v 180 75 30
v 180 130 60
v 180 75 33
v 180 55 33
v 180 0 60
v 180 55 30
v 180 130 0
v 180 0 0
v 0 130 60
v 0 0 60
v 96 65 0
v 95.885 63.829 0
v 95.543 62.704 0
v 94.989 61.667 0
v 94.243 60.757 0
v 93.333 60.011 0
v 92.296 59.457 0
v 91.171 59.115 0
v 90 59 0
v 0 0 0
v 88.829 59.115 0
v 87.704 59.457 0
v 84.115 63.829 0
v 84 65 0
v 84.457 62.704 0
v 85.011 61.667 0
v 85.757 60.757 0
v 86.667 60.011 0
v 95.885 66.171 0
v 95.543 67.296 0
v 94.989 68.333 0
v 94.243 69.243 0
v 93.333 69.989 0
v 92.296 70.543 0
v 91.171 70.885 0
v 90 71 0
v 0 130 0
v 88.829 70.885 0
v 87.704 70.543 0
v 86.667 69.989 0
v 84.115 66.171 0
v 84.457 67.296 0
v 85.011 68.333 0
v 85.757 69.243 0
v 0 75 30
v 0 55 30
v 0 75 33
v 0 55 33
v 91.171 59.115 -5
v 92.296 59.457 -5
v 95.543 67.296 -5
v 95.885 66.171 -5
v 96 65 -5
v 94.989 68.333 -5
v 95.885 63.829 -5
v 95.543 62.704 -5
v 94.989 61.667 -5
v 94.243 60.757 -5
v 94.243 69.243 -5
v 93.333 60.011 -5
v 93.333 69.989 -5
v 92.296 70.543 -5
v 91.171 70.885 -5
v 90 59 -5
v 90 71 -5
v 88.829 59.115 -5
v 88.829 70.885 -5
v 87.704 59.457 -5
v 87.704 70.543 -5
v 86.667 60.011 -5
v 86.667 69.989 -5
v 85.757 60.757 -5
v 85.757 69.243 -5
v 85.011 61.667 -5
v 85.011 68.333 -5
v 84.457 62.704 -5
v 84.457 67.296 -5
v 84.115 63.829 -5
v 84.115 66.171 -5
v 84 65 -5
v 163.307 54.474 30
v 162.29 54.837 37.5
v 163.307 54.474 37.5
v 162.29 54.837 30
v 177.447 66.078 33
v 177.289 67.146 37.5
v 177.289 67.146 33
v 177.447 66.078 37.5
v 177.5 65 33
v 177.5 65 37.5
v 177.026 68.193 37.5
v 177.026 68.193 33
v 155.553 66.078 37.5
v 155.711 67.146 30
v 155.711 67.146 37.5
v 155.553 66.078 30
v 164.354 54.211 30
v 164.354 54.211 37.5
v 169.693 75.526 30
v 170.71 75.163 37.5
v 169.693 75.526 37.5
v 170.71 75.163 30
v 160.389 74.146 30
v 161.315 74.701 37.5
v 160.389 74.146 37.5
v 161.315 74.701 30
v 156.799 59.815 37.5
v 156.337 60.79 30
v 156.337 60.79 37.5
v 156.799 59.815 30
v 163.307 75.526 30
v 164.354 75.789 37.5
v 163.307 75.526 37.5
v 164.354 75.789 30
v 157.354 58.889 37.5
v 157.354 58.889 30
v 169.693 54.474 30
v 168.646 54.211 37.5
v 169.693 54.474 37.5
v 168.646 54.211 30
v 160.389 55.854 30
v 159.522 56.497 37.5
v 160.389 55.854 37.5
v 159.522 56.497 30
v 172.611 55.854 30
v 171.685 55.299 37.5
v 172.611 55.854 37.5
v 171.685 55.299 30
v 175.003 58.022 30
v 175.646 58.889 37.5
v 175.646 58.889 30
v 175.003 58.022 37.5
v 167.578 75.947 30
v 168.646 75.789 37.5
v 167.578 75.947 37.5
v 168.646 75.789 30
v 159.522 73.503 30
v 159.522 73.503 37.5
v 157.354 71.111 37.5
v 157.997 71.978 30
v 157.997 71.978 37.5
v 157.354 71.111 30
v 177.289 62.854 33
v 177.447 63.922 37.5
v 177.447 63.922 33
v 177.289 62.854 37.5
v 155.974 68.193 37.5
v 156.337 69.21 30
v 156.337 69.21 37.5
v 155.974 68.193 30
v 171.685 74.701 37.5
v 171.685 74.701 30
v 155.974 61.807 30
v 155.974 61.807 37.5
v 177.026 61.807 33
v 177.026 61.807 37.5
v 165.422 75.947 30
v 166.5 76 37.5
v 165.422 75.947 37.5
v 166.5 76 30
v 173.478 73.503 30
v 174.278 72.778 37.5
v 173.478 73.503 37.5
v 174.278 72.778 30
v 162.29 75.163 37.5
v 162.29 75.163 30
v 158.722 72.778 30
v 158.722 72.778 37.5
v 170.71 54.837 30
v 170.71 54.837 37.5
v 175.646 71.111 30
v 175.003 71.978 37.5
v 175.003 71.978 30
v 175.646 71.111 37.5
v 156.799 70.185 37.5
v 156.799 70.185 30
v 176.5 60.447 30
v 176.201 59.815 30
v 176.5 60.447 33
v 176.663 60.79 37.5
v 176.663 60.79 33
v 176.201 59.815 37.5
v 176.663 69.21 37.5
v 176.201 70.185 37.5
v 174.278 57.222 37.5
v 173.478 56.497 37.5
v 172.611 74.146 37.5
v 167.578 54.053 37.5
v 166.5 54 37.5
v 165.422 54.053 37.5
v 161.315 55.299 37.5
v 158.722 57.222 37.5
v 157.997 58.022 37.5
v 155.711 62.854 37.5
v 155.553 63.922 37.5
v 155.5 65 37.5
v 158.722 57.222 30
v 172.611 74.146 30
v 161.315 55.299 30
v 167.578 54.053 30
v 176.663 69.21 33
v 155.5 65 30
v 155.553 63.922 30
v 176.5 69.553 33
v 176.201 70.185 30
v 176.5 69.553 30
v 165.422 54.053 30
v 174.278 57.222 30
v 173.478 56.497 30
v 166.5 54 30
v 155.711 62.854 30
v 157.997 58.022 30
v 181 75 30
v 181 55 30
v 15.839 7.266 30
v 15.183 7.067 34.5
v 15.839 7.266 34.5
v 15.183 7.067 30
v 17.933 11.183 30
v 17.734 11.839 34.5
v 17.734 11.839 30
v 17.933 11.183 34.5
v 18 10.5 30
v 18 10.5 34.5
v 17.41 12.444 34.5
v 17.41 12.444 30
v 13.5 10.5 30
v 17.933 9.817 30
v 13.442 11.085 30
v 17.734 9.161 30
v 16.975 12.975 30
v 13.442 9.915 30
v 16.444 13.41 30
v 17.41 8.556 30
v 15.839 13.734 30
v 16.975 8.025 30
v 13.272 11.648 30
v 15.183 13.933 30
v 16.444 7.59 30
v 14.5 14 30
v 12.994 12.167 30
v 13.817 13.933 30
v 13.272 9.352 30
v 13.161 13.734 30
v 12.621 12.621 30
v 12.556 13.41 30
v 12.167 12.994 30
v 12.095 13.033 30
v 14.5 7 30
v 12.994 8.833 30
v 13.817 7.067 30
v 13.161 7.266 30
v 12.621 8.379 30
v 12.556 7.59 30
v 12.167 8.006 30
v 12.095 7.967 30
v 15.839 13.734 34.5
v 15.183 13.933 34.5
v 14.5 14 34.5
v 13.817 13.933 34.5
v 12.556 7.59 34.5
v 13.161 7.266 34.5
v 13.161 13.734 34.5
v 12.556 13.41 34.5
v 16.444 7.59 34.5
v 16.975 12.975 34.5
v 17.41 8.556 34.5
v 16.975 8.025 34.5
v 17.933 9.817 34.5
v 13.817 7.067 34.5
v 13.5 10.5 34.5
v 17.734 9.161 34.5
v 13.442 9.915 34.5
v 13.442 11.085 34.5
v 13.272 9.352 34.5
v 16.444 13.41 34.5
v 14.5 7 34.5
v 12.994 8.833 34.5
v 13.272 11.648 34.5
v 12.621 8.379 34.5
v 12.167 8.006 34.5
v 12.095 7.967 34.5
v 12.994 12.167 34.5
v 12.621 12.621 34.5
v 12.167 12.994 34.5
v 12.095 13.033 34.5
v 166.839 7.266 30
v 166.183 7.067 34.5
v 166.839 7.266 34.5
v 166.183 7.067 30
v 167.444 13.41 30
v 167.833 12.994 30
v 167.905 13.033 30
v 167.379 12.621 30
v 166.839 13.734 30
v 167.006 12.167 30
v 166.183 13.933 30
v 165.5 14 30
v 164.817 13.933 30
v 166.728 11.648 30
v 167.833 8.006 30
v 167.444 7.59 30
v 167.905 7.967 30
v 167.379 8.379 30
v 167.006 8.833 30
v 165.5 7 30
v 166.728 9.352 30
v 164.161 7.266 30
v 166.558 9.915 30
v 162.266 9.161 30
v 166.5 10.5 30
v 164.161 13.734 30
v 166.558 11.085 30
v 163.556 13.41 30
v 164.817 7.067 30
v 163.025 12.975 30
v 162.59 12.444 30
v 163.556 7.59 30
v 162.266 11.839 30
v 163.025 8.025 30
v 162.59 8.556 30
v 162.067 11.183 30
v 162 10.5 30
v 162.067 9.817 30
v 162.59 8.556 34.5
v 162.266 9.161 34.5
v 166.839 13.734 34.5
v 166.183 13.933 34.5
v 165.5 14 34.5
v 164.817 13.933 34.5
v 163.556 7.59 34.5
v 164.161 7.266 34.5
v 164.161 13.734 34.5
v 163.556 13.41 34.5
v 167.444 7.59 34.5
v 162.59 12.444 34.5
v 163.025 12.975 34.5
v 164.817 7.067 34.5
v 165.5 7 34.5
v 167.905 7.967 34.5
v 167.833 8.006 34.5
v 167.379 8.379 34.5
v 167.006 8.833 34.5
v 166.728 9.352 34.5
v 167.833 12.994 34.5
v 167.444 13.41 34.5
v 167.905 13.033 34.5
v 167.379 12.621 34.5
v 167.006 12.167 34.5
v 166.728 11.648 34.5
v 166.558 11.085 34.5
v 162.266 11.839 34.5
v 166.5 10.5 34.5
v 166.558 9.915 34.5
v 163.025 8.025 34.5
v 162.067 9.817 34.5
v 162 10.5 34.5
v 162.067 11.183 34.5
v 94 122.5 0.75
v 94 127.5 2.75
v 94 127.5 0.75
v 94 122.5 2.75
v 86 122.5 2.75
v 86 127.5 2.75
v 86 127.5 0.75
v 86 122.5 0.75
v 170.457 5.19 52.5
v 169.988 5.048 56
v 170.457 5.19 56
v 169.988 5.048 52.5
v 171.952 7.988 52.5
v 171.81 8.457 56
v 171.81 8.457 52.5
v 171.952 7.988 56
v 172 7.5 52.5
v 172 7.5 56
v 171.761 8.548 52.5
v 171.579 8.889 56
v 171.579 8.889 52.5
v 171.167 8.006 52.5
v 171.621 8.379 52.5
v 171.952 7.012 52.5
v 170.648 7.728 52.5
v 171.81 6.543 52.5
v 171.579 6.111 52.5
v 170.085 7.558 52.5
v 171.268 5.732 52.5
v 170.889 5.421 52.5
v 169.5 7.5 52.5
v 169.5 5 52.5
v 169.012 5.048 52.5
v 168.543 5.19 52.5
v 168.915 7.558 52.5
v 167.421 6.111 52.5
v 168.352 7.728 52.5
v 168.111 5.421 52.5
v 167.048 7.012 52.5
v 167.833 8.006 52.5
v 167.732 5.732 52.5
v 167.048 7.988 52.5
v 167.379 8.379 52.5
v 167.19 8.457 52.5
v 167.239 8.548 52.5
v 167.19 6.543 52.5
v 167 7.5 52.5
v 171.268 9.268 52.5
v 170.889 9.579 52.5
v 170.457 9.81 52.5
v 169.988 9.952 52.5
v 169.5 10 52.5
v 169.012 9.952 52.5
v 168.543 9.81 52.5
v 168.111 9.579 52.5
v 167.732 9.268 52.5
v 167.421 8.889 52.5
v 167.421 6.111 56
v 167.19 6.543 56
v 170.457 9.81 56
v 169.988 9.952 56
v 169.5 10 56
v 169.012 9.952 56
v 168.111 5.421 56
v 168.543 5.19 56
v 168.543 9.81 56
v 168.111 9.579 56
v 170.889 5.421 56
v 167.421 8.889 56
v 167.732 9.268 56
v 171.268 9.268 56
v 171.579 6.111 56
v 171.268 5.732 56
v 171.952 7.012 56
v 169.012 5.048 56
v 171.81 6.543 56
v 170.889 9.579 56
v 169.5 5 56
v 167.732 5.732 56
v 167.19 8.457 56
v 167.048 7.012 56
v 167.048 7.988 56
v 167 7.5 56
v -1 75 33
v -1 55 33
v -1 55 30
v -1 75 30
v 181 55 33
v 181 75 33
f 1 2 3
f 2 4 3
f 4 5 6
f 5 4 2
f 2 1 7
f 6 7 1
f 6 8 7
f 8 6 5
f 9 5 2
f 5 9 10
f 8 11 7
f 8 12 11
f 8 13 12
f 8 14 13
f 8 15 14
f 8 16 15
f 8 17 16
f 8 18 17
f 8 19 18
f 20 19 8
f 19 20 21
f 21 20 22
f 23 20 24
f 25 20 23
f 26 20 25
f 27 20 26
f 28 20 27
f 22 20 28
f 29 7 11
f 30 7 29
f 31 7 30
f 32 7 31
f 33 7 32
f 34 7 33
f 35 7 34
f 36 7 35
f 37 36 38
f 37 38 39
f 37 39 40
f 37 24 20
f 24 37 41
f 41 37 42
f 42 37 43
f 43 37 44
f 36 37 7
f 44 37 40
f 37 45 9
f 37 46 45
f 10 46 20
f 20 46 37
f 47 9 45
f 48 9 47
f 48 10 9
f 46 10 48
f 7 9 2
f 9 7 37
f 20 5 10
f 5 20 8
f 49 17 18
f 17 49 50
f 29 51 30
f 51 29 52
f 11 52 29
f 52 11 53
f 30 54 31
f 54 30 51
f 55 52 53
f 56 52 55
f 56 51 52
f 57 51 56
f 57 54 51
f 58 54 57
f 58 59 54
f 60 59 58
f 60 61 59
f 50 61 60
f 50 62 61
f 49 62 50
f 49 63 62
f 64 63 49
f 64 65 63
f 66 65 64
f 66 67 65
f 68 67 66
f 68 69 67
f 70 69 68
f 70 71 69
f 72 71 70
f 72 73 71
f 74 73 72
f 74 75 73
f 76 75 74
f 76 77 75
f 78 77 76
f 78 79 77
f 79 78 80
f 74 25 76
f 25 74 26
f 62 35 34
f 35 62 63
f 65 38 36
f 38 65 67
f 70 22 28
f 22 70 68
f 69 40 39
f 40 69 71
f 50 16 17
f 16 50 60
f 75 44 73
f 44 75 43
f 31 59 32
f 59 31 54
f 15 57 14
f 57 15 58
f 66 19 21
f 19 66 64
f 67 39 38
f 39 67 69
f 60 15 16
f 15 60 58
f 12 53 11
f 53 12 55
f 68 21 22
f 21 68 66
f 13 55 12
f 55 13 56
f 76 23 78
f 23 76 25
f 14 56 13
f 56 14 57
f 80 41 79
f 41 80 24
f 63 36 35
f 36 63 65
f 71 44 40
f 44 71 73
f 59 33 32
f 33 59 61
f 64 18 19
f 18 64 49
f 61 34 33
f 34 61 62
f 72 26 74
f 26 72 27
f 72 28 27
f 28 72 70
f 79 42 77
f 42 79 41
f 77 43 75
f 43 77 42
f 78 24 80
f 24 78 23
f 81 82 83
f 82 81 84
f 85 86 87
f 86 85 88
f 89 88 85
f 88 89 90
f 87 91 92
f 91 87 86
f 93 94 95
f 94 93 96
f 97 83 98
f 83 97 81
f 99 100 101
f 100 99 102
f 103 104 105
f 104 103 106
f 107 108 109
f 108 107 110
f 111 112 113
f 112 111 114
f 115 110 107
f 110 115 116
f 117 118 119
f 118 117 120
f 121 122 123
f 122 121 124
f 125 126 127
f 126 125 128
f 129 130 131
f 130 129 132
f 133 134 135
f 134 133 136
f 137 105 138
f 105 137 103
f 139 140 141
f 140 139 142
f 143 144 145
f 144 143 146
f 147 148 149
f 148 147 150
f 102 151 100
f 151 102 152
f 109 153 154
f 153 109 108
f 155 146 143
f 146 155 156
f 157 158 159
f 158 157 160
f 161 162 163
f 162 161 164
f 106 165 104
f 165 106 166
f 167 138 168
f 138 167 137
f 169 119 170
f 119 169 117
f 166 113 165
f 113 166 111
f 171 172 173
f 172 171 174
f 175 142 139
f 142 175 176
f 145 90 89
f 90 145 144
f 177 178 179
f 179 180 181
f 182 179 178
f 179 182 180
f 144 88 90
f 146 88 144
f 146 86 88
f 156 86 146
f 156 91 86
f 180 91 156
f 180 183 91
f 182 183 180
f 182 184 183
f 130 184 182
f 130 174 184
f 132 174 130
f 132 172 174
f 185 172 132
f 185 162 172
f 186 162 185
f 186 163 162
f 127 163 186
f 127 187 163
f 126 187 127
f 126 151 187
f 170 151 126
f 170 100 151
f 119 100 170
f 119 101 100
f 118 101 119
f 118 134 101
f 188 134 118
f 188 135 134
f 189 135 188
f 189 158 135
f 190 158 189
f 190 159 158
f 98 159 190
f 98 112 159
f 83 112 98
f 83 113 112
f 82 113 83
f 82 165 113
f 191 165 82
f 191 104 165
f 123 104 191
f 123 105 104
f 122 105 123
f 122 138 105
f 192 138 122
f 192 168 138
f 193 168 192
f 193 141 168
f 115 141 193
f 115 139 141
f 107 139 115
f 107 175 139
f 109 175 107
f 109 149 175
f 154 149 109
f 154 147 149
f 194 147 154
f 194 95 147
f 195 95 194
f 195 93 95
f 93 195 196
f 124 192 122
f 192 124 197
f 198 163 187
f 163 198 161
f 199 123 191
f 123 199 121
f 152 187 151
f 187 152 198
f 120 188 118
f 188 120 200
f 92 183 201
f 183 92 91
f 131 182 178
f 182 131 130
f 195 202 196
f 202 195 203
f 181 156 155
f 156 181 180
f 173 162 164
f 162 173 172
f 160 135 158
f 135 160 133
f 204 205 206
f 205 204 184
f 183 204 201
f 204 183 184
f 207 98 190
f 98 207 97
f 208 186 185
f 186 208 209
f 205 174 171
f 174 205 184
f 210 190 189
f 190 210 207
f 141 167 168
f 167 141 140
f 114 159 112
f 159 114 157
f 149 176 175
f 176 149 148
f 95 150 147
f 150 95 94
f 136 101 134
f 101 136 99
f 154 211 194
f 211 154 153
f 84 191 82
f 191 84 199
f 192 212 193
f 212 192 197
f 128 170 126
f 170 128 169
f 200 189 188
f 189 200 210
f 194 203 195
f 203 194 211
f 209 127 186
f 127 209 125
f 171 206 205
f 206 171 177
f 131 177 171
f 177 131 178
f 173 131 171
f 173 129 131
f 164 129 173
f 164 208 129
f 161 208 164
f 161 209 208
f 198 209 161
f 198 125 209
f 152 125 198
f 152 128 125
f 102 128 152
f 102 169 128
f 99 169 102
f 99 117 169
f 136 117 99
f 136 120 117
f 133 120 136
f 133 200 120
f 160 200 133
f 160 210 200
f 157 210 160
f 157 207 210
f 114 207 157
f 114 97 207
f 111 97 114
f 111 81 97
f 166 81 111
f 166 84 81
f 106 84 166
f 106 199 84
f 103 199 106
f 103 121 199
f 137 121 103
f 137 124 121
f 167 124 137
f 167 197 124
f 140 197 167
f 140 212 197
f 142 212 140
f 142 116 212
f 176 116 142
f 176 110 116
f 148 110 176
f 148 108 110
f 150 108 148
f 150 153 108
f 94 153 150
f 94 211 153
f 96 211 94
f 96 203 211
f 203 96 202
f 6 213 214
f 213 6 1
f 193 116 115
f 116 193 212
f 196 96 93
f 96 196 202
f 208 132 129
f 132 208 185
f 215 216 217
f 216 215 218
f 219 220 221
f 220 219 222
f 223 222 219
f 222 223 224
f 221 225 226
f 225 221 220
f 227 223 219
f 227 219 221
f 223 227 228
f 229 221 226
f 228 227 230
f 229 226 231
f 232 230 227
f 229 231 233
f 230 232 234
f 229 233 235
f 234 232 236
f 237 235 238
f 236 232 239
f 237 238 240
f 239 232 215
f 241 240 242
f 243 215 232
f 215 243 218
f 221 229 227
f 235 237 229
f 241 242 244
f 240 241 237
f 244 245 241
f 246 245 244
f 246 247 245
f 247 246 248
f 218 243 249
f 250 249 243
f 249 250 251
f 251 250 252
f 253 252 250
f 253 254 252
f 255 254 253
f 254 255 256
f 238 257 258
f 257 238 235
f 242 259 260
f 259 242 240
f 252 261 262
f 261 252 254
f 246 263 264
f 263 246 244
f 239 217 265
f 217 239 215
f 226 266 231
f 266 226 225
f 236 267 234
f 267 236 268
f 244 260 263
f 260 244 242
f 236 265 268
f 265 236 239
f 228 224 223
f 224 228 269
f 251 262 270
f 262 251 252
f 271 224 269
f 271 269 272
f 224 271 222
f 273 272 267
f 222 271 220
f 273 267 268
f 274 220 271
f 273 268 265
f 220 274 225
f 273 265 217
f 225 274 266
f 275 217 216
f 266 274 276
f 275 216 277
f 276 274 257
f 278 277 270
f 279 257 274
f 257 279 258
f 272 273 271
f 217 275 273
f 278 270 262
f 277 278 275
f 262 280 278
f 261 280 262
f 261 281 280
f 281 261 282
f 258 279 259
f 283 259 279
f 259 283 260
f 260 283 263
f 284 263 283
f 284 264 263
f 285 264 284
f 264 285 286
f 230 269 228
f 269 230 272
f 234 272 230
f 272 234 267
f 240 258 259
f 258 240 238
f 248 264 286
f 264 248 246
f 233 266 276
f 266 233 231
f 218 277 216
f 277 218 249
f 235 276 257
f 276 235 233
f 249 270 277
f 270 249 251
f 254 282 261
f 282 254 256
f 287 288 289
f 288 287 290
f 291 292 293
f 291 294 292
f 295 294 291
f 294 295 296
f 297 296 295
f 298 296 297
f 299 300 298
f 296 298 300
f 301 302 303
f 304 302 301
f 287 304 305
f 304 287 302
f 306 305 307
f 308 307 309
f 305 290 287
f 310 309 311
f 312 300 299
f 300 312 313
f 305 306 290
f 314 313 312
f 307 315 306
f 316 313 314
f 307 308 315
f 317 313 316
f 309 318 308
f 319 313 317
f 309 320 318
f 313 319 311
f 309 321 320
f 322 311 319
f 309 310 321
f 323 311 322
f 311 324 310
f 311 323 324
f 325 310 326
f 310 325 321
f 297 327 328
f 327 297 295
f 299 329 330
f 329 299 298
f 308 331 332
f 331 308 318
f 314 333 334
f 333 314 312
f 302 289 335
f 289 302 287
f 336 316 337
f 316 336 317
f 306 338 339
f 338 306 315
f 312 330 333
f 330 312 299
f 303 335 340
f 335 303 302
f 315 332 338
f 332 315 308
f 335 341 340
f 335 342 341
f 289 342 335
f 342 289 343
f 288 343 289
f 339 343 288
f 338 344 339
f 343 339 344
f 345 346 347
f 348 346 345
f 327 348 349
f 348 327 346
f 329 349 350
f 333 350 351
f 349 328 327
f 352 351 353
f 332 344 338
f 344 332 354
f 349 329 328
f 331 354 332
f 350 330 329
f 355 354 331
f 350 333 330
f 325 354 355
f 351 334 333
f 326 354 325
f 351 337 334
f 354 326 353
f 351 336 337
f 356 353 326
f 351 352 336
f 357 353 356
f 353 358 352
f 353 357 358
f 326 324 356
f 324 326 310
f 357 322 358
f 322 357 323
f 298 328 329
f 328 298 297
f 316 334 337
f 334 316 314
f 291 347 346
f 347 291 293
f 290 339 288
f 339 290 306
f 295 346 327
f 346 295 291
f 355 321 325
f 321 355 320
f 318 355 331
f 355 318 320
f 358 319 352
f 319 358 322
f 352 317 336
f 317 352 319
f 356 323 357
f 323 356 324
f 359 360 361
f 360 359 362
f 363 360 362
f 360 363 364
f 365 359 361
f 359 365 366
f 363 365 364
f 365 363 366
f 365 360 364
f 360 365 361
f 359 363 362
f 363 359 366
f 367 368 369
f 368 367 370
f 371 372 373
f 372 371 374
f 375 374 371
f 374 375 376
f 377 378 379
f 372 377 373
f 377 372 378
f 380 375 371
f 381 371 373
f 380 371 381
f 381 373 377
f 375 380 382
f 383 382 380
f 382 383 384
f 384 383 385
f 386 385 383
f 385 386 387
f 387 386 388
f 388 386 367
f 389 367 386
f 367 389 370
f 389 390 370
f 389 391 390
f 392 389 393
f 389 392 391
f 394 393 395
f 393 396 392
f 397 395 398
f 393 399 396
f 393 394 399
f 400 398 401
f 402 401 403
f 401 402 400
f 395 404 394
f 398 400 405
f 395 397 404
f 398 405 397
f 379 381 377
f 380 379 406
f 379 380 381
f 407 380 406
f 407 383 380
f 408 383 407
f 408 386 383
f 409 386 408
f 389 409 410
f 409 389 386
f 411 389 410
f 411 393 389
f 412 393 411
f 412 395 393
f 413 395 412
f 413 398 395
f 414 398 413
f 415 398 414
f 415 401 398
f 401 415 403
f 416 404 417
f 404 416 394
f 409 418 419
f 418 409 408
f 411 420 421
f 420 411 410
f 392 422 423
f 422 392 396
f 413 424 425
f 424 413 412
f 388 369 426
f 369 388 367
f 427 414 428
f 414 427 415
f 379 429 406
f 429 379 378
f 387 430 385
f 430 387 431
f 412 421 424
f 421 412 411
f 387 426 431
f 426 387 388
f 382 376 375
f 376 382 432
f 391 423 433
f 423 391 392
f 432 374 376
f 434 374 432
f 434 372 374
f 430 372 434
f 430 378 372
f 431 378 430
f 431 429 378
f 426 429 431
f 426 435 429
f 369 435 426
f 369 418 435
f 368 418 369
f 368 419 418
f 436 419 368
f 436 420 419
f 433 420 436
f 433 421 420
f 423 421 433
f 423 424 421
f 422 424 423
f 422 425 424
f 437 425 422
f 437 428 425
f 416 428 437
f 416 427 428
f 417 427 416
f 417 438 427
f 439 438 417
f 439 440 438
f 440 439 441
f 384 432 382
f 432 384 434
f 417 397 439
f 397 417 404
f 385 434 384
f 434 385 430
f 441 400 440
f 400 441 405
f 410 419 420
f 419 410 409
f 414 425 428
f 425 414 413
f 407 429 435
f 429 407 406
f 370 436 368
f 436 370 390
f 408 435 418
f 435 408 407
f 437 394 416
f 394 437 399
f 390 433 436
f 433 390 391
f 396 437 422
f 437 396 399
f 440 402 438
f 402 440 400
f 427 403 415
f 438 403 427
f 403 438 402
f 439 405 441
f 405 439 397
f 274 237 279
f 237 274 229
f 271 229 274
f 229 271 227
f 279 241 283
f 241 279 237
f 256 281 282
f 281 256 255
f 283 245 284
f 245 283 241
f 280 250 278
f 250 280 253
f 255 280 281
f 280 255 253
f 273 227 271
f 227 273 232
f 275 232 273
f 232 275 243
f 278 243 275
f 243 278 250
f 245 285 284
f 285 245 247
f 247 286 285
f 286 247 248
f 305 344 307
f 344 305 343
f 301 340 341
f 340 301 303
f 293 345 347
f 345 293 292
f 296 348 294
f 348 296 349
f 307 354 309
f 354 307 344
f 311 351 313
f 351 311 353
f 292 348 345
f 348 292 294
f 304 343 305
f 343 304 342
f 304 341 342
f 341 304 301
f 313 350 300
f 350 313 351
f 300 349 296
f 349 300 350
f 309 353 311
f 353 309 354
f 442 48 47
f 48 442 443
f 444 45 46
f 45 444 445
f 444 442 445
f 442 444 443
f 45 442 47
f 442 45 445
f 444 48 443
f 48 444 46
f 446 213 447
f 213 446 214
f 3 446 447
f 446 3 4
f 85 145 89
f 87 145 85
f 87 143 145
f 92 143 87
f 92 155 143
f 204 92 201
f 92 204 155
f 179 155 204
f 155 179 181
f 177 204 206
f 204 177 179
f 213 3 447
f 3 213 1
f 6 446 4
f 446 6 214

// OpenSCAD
// INTEGRATED ANTENNA ANALYZER - MAIN ENCLOSURE (OpenSCAD)
// Portable vector network analyzer, all ham bands 1.8MHz-1.3GHz
// Enclosure: 180mm × 130mm × 60mm (fits in 1L dry bag for field work)
// Material: 3D-printed PETG or resin (rigid, lightweight)

// External dimensions
enclosure_length = 180;    // X-axis (longest dimension, left-right)
enclosure_width = 130;     // Y-axis (front-back)
enclosure_height = 60;     // Z-axis (vertical)

// Wall thickness
wall_thickness = 2.5;      // 2.5mm PETG provides rigidity while staying light

// Internal clearances
internal_length = enclosure_length - (2 * wall_thickness);
internal_width = enclosure_width - (2 * wall_thickness);
internal_height = enclosure_height - (2 * wall_thickness);

// Display dimensions (3.5" ILI9341 TFT)
tft_width = 86;            // Physical LCD panel width in mm
tft_height = 65;           // Physical LCD panel height in mm
tft_thickness = 2.5;       // PCB thickness

// Module organization (fit inside enclosure)
// Front half: Display (70mm)
// Back half: Electronics, battery space (50mm)

module main_enclosure_box() {
  // Outer shell (including bottom, sides, top)
  translate([0, 0, 0])
    cube([enclosure_length, enclosure_width, enclosure_height]);

  // Subtract interior (hollow it out)
  translate([wall_thickness, wall_thickness, wall_thickness])
    cube([internal_length, internal_width, internal_height]);
}

module display_cutout() {
  // TFT display opening (front panel)
  // Positioned: center X, top Y, with anti-glare lip

  display_x_offset = (enclosure_length - tft_width) / 2;  // Center horizontally
  display_y_offset = wall_thickness;                       // Top of front panel
  display_z_offset = enclosure_height - tft_height - wall_thickness - 5;  // Recessed

  translate([display_x_offset - 2, display_y_offset - 2, display_z_offset])
    cube([tft_width + 4, tft_height + 3, 10]);  // Oversized for lip retention
}

module rotary_encoder_hole() {
  // Rotary encoder shaft (22mm diameter, for band selector)
  // Positioned: right edge, center vertically

  encoder_x = enclosure_length - wall_thickness - 11;    // 11mm from edge
  encoder_y = enclosure_width / 2;
  encoder_z = enclosure_height / 2;

  translate([encoder_x, encoder_y, encoder_z])
    cylinder(h=wall_thickness+5, r=11, $fn=64);  // 22mm diameter
}

module sma_port_dut() {
  // DUT port (SMA connector, main measurement input)
  // Positioned: front-left corner, mid-height

  dut_x = wall_thickness + 12;
  dut_y = wall_thickness + 8;
  dut_z = enclosure_height / 2;

  translate([dut_x, dut_y, dut_z])
    cylinder(h=wall_thickness+2, r=3.5, $fn=32);  // 7mm diameter SMA feedthrough
}

module sma_port_ref() {
  // Reference port (SMA connector)
  // Positioned: front-right corner, mid-height

  ref_x = enclosure_length - wall_thickness - 12;
  ref_y = wall_thickness + 8;
  ref_z = enclosure_height / 2;

  translate([ref_x, ref_y, ref_z])
    cylinder(h=wall_thickness+2, r=3.5, $fn=32);  // 7mm diameter
}

module usb_charging_port() {
  // Micro-USB charging port (bottom rear)
  // Positioned: center X, back edge Y

  usb_x = enclosure_length / 2;
  usb_y = enclosure_width - wall_thickness - 3;
  usb_z = wall_thickness / 2;

  // USB-C or Micro-USB cutout (8mm × 3.5mm)
  translate([usb_x - 4, usb_y - 2, usb_z - 0.5])
    cube([8, 5, 2]);  // Cutout for USB plug
}

module status_led_aperture() {
  // Bicolor LED indicator (red/green)
  // Positioned: top-right corner

  led_x = enclosure_length - wall_thickness - 8;
  led_y = wall_thickness + 5;
  led_z = enclosure_height - wall_thickness - 5;

  translate([led_x, led_y, led_z])
    cylinder(h=wall_thickness+1, r=2.5, $fn=32);  // 5mm diameter LED
}

module battery_access_door_hinge() {
  // Rear door access (battery compartment)
  // Hinge axis: left edge, horizontal

  hinge_x = wall_thickness + 5;
  hinge_y = enclosure_width - wall_thickness - 5;
  hinge_z = (enclosure_height / 2) - 8;

  translate([hinge_x, hinge_y, hinge_z])
    cylinder(h=20, r=2, $fn=32);  // 4mm hinge pin hole
}

module antenna_tripod_mount_boss() {
  // 1/4"-20 UNC threaded boss for tripod/boom attachment
  // Located at center-bottom

  boss_x = enclosure_length / 2;
  boss_y = enclosure_width / 2;
  boss_z = -5;  // Protrudes below enclosure

  translate([boss_x, boss_y, boss_z])
    cylinder(h=10, r=6, $fn=32);  // 12mm diameter boss

  // Internal thread (for M5 threaded insert or tapping)
  translate([boss_x, boss_y, boss_z + 2])
    cylinder(h=6, r=2.5, $fn=32);  // 5mm hole for M5 screw
}

module internal_mounting_posts() {
  // Posts for PCB, display, and battery module attachment

  post_height = internal_height - 5;
  post_radius = 3;  // 6mm diameter posts

  // Front-left post (display PCB)
  translate([wall_thickness + 8, wall_thickness + 8, wall_thickness])
    cylinder(h=post_height, r=post_radius, $fn=32);

  // Front-right post (display PCB)
  translate([enclosure_length - wall_thickness - 8, wall_thickness + 8, wall_thickness])
    cylinder(h=post_height, r=post_radius, $fn=32);

  // Back-left post (RF/power PCB)
  translate([wall_thickness + 15, enclosure_width - wall_thickness - 12, wall_thickness])
    cylinder(h=post_height, r=post_radius, $fn=32);

  // Back-right post (RF/power PCB)
  translate([enclosure_length - wall_thickness - 15, enclosure_width - wall_thickness - 12, wall_thickness])
    cylinder(h=post_height, r=post_radius, $fn=32);
}

module strap_anchor_points() {
  // Anchor points for carrying strap (both sides)

  strap_width = 20;  // 20mm wide strap
  strap_height = 3;  // Thin slot

  // Left-side strap anchor (mid-height)
  translate([-1, (enclosure_width / 2) - 10, enclosure_height / 2])
    cube([wall_thickness + 2, strap_width, strap_height]);

  // Right-side strap anchor (mirror)
  translate([enclosure_length - wall_thickness - 1, (enclosure_width / 2) - 10, enclosure_height / 2])
    cube([wall_thickness + 2, strap_width, strap_height]);
}

module cable_strain_relief() {
  // Strain relief clips inside enclosure (prevent internal cable damage)

  clip_thickness = 1.5;
  clip_width = 8;

  // USB cable clip (inside rear panel)
  translate([enclosure_length / 2 - 4, enclosure_width - wall_thickness - 3, wall_thickness + 2])
    cube([clip_width, clip_thickness, 8]);

  // SMA cable clips (inside side panels)
  translate([wall_thickness + 1, 15, enclosure_height / 2 - 4])
    cube([clip_thickness, 8, 10]);

  translate([enclosure_length - wall_thickness - 1.5, 15, enclosure_height / 2 - 4])
    cube([clip_thickness, 8, 10]);
}

module ventilation_slots() {
  // Passive cooling via small slots (prevent thermal buildup)

  slot_spacing = 8;
  slot_width = 2;
  slot_height = 3;

  // Top ventilation (4 slots across length)
  for (i = [1:4]) {
    slot_x = wall_thickness + (i * 40);
    slot_y = enclosure_width - wall_thickness - 2;
    translate([slot_x, slot_y, enclosure_height - wall_thickness + 0.5])
      cube([slot_width, 3, slot_height]);
  }
}

// MAIN ASSEMBLY
difference() {
  main_enclosure_box();

  // Subtract all cutouts
  display_cutout();
  rotary_encoder_hole();
  sma_port_dut();
  sma_port_ref();
  usb_charging_port();
  status_led_aperture();
  battery_access_door_hinge();
  antenna_tripod_mount_boss();

  // Add mounting posts (additive, not subtractive, but organized here)
  // Use union for assembly view
}

// Add mounting posts and internal structure
union() {
  difference() {
    main_enclosure_box();
    display_cutout();
    rotary_encoder_hole();
    sma_port_dut();
    sma_port_ref();
    usb_charging_port();
    status_led_aperture();
    ventilation_slots();
  }

  internal_mounting_posts();
  antenna_tripod_mount_boss();
  strap_anchor_points();
  cable_strain_relief();
}

// NOTES FOR MANUFACTURING:
// 1. Print in PETG or resin at 0.15mm layer height for accuracy
// 2. Support material: minimal (only underhangs)
// 3. Orientation: print with display opening UP to minimize supports
// 4. Post-processing: sand to 120 grit for better finish
// 5. Threading: tap M5 hole manually after printing (if not using threaded inserts)
// 6. Assembly: use PCB spacers (6mm) on mounting posts
// 7. Sealing: optional silicone gasket around display cutout (not essential)
// 8. Paint: optional acrylic black paint (improves appearance and RF shielding)
